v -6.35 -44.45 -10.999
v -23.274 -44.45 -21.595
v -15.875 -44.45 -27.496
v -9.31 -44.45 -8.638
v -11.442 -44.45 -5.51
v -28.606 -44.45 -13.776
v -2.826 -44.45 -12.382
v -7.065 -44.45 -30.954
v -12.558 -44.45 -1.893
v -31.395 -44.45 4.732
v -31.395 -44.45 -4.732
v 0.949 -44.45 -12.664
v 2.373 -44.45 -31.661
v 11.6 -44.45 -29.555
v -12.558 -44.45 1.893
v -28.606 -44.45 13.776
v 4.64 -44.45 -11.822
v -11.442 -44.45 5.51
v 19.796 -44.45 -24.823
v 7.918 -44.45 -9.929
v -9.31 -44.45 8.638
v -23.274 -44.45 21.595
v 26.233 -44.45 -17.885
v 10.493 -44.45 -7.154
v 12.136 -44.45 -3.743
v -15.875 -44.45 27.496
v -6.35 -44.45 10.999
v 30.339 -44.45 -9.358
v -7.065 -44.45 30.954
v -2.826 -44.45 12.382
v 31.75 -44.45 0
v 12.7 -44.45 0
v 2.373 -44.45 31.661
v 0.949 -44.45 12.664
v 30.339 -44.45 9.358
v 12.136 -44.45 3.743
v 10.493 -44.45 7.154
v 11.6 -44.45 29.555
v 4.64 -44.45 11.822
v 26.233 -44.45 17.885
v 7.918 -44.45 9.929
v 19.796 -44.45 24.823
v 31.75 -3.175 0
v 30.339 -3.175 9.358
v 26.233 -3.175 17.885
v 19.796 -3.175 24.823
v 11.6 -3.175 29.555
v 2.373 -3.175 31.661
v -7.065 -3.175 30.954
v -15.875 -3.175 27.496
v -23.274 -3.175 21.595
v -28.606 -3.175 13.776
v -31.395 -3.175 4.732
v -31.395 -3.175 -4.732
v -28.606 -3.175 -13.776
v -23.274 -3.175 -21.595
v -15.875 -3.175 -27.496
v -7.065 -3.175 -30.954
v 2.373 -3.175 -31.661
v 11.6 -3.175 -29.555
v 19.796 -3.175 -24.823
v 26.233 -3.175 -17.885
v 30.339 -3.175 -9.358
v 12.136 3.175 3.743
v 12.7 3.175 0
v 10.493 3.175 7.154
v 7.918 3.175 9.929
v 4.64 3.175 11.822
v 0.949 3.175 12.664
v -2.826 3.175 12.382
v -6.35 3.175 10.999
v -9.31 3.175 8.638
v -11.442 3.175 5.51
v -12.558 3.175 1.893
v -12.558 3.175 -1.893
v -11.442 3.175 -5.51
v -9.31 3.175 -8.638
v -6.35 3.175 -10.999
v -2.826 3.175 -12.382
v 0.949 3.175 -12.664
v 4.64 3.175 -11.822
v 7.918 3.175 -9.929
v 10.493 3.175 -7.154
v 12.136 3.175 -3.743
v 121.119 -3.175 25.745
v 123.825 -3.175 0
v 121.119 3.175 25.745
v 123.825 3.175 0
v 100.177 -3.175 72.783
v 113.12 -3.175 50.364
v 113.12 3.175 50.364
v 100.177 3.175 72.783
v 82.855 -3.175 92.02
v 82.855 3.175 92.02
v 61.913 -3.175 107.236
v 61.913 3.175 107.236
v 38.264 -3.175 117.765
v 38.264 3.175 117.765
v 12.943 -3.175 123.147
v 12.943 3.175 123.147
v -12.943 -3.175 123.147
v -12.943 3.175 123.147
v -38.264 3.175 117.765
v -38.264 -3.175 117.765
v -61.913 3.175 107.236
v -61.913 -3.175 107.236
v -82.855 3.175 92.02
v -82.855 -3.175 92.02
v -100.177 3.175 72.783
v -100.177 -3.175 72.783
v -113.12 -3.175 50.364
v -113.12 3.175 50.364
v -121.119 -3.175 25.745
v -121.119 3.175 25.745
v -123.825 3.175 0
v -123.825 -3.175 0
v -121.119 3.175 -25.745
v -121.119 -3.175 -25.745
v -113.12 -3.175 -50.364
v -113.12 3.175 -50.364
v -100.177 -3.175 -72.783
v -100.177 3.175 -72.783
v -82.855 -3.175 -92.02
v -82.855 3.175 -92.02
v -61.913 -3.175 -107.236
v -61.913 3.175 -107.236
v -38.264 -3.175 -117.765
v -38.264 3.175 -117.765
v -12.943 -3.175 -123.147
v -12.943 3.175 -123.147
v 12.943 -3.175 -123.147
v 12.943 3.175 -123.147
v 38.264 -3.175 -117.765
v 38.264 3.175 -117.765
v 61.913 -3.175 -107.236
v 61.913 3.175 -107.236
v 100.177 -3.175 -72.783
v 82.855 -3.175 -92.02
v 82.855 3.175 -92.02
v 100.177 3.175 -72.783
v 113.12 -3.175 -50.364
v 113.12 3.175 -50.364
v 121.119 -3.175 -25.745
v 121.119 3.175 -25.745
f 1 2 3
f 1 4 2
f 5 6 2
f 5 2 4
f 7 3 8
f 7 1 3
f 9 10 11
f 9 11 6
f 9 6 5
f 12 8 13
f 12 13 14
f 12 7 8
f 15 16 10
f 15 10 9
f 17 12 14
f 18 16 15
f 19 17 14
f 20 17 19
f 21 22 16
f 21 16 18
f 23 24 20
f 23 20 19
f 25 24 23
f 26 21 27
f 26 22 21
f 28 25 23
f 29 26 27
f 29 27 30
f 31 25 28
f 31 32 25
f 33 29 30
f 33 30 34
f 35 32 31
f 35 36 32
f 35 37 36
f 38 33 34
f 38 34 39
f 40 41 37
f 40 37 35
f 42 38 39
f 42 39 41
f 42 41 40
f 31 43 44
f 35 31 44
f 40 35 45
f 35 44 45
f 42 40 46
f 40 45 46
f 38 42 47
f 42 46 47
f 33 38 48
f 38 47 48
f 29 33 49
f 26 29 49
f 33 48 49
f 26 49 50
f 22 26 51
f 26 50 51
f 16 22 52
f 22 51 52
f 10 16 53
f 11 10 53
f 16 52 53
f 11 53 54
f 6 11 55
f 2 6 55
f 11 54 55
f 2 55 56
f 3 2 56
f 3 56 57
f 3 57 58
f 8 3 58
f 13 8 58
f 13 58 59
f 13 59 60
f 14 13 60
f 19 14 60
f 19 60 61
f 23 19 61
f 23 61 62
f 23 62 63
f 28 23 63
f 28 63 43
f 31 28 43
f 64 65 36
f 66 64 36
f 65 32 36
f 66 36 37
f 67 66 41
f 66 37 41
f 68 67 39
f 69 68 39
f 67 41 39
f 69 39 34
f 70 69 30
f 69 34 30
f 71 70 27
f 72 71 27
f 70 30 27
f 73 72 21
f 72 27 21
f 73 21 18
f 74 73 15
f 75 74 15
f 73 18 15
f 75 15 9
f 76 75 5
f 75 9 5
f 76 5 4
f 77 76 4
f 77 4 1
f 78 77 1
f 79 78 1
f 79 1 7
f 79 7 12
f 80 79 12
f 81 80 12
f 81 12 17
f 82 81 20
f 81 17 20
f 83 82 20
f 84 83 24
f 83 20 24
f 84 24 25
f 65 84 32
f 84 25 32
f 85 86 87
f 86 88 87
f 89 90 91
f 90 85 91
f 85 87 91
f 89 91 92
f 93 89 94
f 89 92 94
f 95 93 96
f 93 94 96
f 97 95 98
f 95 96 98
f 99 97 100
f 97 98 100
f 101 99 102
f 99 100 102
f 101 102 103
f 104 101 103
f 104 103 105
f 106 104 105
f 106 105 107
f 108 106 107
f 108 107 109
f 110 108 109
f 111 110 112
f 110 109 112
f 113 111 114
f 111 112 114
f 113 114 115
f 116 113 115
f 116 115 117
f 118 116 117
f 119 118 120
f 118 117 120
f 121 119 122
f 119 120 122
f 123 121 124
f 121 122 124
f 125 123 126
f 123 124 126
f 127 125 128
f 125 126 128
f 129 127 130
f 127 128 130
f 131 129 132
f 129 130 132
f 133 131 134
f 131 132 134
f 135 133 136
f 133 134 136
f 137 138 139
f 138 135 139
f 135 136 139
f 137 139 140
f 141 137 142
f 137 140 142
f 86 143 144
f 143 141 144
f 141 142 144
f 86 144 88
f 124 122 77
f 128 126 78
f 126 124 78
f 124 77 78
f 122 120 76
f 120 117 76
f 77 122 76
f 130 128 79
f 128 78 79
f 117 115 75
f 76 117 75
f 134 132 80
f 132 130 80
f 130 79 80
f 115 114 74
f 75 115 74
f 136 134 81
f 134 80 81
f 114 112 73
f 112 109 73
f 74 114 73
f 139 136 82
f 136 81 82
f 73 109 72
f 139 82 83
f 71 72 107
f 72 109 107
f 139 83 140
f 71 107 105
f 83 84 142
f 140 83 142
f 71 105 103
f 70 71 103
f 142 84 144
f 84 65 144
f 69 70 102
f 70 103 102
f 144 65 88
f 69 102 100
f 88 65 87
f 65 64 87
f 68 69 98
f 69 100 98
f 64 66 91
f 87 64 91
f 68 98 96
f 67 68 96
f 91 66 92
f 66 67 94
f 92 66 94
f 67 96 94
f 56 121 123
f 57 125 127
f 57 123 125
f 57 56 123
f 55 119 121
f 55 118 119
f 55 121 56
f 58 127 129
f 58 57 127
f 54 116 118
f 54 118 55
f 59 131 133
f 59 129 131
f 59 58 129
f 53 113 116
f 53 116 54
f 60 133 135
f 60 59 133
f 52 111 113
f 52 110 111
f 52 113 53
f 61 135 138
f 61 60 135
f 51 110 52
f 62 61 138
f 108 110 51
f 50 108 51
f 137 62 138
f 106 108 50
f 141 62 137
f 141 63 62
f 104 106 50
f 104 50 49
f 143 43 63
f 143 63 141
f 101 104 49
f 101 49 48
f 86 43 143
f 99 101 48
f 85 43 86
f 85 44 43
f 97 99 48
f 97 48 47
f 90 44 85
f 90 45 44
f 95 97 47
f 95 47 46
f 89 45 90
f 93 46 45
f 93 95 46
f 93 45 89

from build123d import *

# Parameters (mm, degrees)
F0_R     = 31.75
F0_R_2   = 12.7
F1_DEPTH = 44.45
F2_R     = 127
F3_DEPTH = 3.175
F4_R     = 12.7
F5_DEPTH = 38.1
F6_R     = 127
F6_R_2   = 123.825
F7_DEPTH = 12.7


with BuildPart() as f1:
    # F0 (on Front) → F1 (new body)
    with BuildSketch(Plane.XZ):
        Circle(F0_R)
        Circle(F0_R_2, mode=Mode.SUBTRACT)
    extrude(amount=F1_DEPTH)

    # F2 (on Front) → F3 (join, symmetric)
    with BuildSketch(Plane.XZ):
        Circle(F2_R)
    extrude(amount=F3_DEPTH, both=True)

    # F4 (on face) → F5 (cut, symmetric)
    with BuildSketch(Plane.XZ.offset(3.175)):
        Circle(F4_R)
    extrude(amount=F5_DEPTH, both=True, mode=Mode.SUBTRACT)

    # F6 (on face) → F7 (cut, symmetric)
    with BuildSketch(Plane.XZ.offset(3.175)):
        Circle(F6_R)
        Circle(F6_R_2, mode=Mode.SUBTRACT)
    extrude(amount=F7_DEPTH, both=True, mode=Mode.SUBTRACT)


solid = f1.part
